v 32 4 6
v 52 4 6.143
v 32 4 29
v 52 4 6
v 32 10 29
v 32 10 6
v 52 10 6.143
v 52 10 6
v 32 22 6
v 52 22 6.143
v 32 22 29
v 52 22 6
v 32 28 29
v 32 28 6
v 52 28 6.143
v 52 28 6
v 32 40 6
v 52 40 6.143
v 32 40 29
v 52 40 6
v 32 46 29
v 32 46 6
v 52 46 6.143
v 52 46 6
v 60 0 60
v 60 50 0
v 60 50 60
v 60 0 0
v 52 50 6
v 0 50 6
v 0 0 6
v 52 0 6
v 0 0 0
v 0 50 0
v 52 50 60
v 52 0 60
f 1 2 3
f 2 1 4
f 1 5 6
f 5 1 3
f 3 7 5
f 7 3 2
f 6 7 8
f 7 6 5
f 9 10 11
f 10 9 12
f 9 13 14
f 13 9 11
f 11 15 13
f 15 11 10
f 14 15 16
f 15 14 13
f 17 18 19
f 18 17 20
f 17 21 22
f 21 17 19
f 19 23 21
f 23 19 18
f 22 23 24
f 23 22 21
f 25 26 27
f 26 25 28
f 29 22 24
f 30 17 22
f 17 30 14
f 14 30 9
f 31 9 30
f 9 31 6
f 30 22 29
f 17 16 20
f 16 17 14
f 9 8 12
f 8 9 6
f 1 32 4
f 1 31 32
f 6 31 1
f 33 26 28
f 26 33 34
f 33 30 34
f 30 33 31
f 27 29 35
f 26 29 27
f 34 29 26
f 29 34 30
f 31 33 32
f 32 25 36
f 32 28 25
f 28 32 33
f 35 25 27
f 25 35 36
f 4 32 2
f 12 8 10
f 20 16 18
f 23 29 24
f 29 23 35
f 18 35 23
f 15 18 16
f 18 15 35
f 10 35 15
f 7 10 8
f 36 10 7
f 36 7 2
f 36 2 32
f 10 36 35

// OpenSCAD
$fn = 32;

// ----------------------------------------------------------------------
// Rib bracket: 3-gusset L bracket
// ----------------------------------------------------------------------

// --- parameters (mm) ---
base_l = 60;              // foot length, X
base_w = 50;              // foot width, Y
base_t = 6;               // foot thickness
plate_t = 8;              // upright plate thickness
plate_h = 60;             // overall height
gus_l = 20;               // gusset leg along the foot
gus_h = 24;               // gusset height
gus_t = 6;                // gusset thickness
gus_edge = 4;             // gusset margin from the foot edge
n_gus = 3;                // gusset count

gus_pitch = (base_w - 2 * gus_edge - gus_t) / (n_gus - 1);  // gusset pitch

union() {
  cube([base_l, base_w, base_t]);
  translate([base_l - plate_t, 0, base_t - 1])
    cube([plate_t, base_w, plate_h - base_t + 1]);
  for (i = [0 : n_gus - 1])
    translate([base_l - plate_t - gus_l, gus_edge + i * gus_pitch, base_t - 1])
      rotate([-90, 0, 0])
        linear_extrude(height = gus_t)
          polygon(points = [[0, 0], [gus_l + 1, 0], [0, -gus_h]]);
}
